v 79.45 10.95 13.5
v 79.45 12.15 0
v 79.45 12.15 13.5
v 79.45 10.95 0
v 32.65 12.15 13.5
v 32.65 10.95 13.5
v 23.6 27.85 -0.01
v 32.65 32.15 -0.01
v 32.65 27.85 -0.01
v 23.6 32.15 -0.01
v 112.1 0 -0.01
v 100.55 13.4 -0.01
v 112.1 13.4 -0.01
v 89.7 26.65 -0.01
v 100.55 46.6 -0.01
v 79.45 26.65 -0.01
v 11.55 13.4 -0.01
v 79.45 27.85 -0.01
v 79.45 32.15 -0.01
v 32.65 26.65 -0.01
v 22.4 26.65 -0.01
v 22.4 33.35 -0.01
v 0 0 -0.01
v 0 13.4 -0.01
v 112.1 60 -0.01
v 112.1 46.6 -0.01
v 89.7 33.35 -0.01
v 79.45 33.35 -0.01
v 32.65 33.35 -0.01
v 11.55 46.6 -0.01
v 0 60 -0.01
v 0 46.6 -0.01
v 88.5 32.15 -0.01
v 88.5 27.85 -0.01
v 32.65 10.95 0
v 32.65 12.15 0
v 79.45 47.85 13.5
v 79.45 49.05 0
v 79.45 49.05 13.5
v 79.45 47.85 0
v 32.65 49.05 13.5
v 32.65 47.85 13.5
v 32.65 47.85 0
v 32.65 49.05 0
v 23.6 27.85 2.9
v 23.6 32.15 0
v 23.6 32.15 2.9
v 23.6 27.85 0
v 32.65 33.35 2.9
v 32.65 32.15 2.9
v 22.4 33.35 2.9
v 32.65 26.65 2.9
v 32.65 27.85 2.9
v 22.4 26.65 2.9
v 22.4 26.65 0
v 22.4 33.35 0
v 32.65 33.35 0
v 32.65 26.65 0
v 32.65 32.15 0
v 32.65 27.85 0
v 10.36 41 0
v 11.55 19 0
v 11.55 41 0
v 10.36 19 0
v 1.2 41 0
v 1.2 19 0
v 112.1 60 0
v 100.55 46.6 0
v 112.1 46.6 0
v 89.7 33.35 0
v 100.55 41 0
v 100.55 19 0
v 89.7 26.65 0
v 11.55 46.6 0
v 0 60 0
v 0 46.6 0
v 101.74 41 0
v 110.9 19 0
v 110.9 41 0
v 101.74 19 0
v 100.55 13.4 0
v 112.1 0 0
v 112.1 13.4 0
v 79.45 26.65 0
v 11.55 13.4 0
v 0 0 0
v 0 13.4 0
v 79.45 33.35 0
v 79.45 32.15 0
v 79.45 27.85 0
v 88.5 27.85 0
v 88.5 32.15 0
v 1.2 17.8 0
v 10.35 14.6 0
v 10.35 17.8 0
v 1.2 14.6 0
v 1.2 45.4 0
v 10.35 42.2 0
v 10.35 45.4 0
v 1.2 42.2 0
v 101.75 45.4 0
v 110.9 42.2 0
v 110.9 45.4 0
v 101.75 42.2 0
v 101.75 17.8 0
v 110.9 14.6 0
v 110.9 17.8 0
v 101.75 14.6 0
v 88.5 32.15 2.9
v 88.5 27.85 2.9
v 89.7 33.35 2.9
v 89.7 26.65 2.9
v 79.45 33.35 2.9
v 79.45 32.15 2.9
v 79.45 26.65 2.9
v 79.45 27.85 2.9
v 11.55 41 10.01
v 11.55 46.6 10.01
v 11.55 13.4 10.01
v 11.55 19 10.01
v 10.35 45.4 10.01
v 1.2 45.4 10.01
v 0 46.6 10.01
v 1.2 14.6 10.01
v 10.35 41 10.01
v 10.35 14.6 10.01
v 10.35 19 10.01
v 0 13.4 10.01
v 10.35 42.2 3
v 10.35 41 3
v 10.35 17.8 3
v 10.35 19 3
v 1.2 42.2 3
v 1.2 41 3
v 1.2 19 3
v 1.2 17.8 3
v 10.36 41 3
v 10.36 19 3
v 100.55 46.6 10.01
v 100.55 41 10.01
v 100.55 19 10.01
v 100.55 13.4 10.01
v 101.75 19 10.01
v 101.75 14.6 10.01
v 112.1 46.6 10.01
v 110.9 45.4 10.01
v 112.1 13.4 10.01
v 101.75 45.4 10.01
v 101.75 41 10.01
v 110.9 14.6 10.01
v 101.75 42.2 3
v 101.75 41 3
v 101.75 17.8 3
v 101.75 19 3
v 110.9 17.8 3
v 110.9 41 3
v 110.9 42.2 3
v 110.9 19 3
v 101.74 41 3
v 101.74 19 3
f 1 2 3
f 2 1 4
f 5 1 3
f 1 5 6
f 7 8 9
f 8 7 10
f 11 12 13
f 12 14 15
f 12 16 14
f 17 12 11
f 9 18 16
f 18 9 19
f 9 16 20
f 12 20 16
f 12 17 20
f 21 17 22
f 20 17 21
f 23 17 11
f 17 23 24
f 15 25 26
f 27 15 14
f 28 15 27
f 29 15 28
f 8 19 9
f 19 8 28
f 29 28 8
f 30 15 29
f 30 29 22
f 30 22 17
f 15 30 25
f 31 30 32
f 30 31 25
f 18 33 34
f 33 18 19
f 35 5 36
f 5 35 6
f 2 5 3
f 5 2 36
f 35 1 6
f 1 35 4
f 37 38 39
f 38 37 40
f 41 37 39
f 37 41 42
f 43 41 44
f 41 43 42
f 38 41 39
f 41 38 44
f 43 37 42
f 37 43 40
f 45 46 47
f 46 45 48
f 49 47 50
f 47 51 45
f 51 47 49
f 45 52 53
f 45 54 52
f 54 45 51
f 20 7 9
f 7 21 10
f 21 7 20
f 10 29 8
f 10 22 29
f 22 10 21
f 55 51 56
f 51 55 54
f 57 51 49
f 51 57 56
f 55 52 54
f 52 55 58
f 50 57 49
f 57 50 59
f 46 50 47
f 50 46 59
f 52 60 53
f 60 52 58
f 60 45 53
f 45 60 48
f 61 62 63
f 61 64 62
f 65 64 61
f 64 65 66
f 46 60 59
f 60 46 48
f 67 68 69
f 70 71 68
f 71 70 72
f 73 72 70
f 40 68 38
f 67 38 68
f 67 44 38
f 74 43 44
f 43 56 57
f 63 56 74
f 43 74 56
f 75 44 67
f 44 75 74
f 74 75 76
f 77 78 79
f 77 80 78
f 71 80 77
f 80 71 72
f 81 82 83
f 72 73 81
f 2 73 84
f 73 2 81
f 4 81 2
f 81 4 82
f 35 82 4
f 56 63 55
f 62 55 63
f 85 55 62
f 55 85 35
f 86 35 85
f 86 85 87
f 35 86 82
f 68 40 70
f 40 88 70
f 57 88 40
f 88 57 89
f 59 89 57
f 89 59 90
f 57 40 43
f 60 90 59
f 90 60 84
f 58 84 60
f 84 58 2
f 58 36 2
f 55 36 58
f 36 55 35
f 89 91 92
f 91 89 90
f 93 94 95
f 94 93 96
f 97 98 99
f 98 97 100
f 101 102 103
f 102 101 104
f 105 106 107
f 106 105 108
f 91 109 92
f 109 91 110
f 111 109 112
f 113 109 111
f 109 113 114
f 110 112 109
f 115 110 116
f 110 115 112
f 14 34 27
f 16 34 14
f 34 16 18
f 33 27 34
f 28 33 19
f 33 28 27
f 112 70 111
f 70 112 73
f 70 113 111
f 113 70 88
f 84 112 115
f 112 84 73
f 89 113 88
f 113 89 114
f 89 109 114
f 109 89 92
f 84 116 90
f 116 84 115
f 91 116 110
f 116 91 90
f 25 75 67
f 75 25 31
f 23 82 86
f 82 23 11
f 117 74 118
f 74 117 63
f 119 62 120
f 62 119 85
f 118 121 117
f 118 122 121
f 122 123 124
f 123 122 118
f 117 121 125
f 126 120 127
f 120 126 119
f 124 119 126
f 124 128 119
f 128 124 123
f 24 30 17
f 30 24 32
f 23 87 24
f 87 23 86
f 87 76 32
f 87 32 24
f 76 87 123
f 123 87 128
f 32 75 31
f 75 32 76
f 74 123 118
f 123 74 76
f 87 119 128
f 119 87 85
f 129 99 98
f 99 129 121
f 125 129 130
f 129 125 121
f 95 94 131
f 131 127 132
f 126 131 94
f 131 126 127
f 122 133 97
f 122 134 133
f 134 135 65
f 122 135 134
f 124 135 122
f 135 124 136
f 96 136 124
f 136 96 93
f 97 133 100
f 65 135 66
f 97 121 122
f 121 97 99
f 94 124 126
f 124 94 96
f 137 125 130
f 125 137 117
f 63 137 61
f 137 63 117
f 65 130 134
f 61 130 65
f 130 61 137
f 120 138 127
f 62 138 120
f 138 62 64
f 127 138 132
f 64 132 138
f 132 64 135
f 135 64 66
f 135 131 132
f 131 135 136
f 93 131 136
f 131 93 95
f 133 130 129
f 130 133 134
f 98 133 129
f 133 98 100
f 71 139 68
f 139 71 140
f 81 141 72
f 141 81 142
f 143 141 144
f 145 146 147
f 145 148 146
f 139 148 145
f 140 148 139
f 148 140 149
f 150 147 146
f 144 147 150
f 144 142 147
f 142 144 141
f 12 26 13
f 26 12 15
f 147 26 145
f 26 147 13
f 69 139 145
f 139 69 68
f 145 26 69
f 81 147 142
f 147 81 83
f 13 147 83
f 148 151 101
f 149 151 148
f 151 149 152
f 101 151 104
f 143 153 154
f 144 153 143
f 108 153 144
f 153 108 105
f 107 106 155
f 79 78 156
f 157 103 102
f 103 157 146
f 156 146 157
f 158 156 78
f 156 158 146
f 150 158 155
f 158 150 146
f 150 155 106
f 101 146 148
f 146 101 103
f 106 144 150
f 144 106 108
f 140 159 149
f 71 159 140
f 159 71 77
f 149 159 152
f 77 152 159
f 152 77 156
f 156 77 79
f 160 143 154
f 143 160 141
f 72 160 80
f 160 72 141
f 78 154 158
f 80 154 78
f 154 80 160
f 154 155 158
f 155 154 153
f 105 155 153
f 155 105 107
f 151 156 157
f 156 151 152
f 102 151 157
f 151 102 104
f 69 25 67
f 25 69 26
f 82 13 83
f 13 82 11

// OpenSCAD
// file: ../Base/Boxes.scad
// Fischertechnik Box Foundation
// Pre-designed Boxes

use <Constants.scad>

include <PlacementOptions.scad>

box190Width = 190;
box190Depth = 130;
box130Width = 130;
box130Depth = 95;
boxUsageHeight = 33.9;
boxWallThickness = 2.4;
boxBaseThickness = 1.0;

// getBoxWallThickness()
// Gets the wall thickness of a Fischertechnik Box

function getBoxWallThickness() = boxWallThickness;

// Gets the usable height of a fischertechnik box
function getBoxUsageHeight() = boxUsageHeight;

// Gets the thickness of the Fischertechnik box base.
function getBoxBaseThickness() = boxBaseThickness;

// Gets the usable inner space of a Box 190 as an x/y-list
function getBox190Space() = [
    box190Width - 2*getBoxWallThickness(), 
    box190Depth - 2*getBoxWallThickness() ];

// Imports the Fischertechnik empty box 130x190 mm and places it at position 0,0
// 190x130 are the outer sizes, the inner space is slightly smaller. Use getBox190Space() to get the inner sizes.
// This module needs the STL file "Fischertechnik Box 130x190.stl" in the library path.
// The box is positioned that the usable inner space is at the 0,0,0 position. The

module Box190() {
    translate([-getBoxWallThickness(),-getBoxWallThickness(),-getBoxBaseThickness()])
        import("Fischertechnik Box 130x190.stl", convexity=3);
}

// Gets the usable inner space of a Box 130 as an x/y-list
function getBox130Space() = [
    box130Width - 2*getBoxWallThickness(), 
    box130Depth - 2*getBoxWallThickness() ];

// Imports the Fischertechnik empty box 95x130 mm and places it at position 0,0
// 190x130 are the outer sizes, the inner space is slightly smaller. Use getBox190Space() to get the inner sizes.
// This module needs the STL file "Fischertechnik Box 95x130.stl" in the library path.
// The box is positioned that the usable inner space is at the 0,0,0 position. The

module Box130() {
    translate([-getBoxWallThickness(),-getBoxWallThickness(),-getBoxBaseThickness()])
        import("Fischertechnik Box 95x130.stl", convexity=3);
}

// Creates a web at the specified box walls
// corner 0 = LowerLeft, 1 = UpperLeft, 2 = UpperRight, 3 = LowerRight
// side 0 = LeftOfCorner, 1 = RightOfCorner
// distance = Distance in mm from the corner
// box = inner width and depth of the box (default: Box 190)
// webWidth = length of the web (default is 3 mms)
// webThickness = thickness of the web (default is 1 mm)

module BoxWeb(corner, side, distance, box=getBox190Space(), webWidth=3, webThickness=1.0) {
    sink = getBoxWallThickness()/2;

    width = (corner % 2 == 0) ? 
            (side == LeftOfCorner ? webWidth : webThickness) :
            (side == LeftOfCorner ? webThickness : webWidth);

    depth = (corner % 2 == 0) ? 
            (side == RightOfCorner ? webWidth : webThickness) :
            (side == RightOfCorner ? webThickness : webWidth);
    
    xDiff = corner == LowerLeft ? 
                (side == LeftOfCorner ? -sink : distance) :
            (corner == UpperLeft ?                
                (side == LeftOfCorner ? distance : -sink) :
            (corner == UpperRight ?
                (side == LeftOfCorner ? box.x-webWidth+sink : box.x-distance-webThickness) :
                (side == LeftOfCorner ? box.x-distance-webThickness: box.x-webWidth+sink)));

    yDiff = corner == LowerLeft ? 
                (side == RightOfCorner ? -sink : distance) :
            (corner == UpperLeft ?
                (side == RightOfCorner ? box.y-distance : box.y-webWidth+sink) :
            (corner == UpperRight ?
                (side == RightOfCorner ? box.y-webWidth+sink : box.y-distance) :
                (side == RightOfCorner ? distance : -sink)));
    
    translate([xDiff, yDiff, -getExcess()])
        cube([width, depth, boxUsageHeight + 2*getExcess()]);
}
// file: ../Base/Rotation.scad
// Fischertechnik Box Foundation
// Geometry Helpers Rotation

include <PlacementOptions.scad>

// getRotatedSpace(space, rotation=NoRotation)
// Rotates the space dependent on the specified rotation

function getRotatedSpace(space, rotation=NoRotation) = [
    (rotation == Rotate90 || rotation == Rotate270) ? space.y : space.x,
    (rotation == Rotate90 || rotation == Rotate270) ? space.x : space.y
];

// Rotates the given space around the fixed left lower corner
// space = the space the children needs as width/depth list [width,depth]
// rotation = 0 Rotate0 degrees, 1 Rotate90 degrees, 2 Rotate180 degrees, 3 Rotate270 degrees (equivalent to -90)

module RotateFix(space, rotation=Rotate0) {
    dy = (rotation == Rotate0 || rotation == Rotate270) ? 0 :
        (rotation == Rotate90) ? space.x :
        space.y;
    dx = (rotation < Rotate180) ? 0 :
        (rotation == Rotate180) ? space.x :
        space.y;
    
    translate([dx, dy, 0])
        rotate([0, 0, rotations[rotation]])
            children();
}
// file: ../Base/Alignment.scad
// Fischertechnik Box Foundation
// Geometry Helpers Alignment

include <PlacementOptions.scad>

// getAlignedX(elementWidth, spaceWidth, align=AlignRight, offset=0)
// Gets the aligned X offset of an element with the given
// width in the given space.
// elementWidth = The width of the element to positon
// spaceWidth = The space where the element should be aligned
// align = 0 AlignLeft, 1 AlignCenter, 2 AlignRight
// offset = an optional offset from the aligned position. When
// aligned left or centered, then positive values are in X direction.
// When aligned right then positive values are in negative X direction.

function getAlignedX(elementWidth, spaceWidth, align=AlignRight, offset=0) =
    (align == AlignLeft) ?
        offset :
        ((align == AlignCenter) ?
        (spaceWidth - elementWidth)/2 + offset :
        spaceWidth - offset - elementWidth);

// getAlignedY(elementDepth, spaceDepth, align=AlignTop, offset=0)
// Gets the aligned Y offset of an element with the given
// depth in the given space.
// elementDepth = The depth of the element to positon
// spaceDepth = The space where the element should be aligned
// align = 0 AlignBottom, 1 AlignCenter, 2 AlignTop
// offset = an optional offset from the aligned position. When
// aligned bottom or centered, then positive values are in Y direction.
// When aligned top then positive values are in negative Y direction.

function getAlignedY(elementDepth, spaceDepth, align=AlignTop, offset=0) =
    (align == AlignBottom) ?
        offset :
        ((align == AlignCenter) ?
        (spaceDepth - elementDepth)/2 + offset :
        spaceDepth - offset - elementDepth);
// file: ../Base/PlacementOptions.scad
// Fischertechnik Box Foundation
// Placement Options

// Alignment
NoAlign = 0;
AlignLeft = 1;
AlignBottom = 2;
AlignCenter = 3;
AlignRight = 4;
AlignTop = 5;

// Element rotation degree steps
rotations = [0, -90, -180, -270];

// Rotation
NoRotation = 0;
Rotate0 = 0;
Rotate90 = 1;
Rotate180 = 2;
Rotate270 = 3;

// Docking (seen from above)
NoDock = -1;
DockLeft = 0;
DockTop = 1;
DockRight = 2;
DockCorner = 2;
DockBottom = 3;

// Web corners
LowerLeft = 0;
UpperLeft = 1;
UpperRight = 2;
LowerRight = 3;

// Web position relative to corner
LeftOfCorner = 0;
RightOfCorner = 1;
// file: ../Base/Placement.scad
// Fischertechnik Box Foundation
// Geometry Helpers Placement

use <Constants.scad>
use <Alignment.scad>
use <Rotation.scad>
use <Boxes.scad>

include <PlacementOptions.scad>

// Place(x=0, y=0, elementSpace=[0,0], alignX=AlignLeft, alignY=AlignBottom, rotation=Rotate0, boxSpace=getBox190Space())
// Places the child at the specified position
// y = Y-Position. This is a relative position when an X aligment is specified.
// x = X-Position. This is a relative position when an Y aligment is specified.
// elementSpace = space of the element to be placed [x,y]
// alignX = -1=NoAlign, 0 AlignLeft, 1 AlignCenter, 3 AlignRight (elementSpace and boxSpace required!)
// alignY = -1=NoAlign, 2 AlignBottom, 1 AlignCenter, 4 AlignTop (elementSpace and boxSpace required!)
// rotation = 0 Rotate0 0 degrees, 1 Rotate90 90 degrees, 
// 2 Rotate180 180 degrees, 3 Rotate270 270 degrees (equivalent to -90)
// boxSpace = Inner space of the box where the placement occurs [x,y] - default is Box 190x130 inner space

module Place(x=0, y=0, elementSpace=[0,0], 
  alignX=AlignLeft, alignY=AlignBottom, 
  rotation=NoRotation, boxSpace=getBox190Space()) {

    module Position(x, y, space, rotation=Rotate0) {
        translate([x, y, 0])
            RotateFix(space, rotation)
                children(0);
    }

    space = getRotatedSpace(elementSpace, rotation);
    alignedX = getAlignedX(space.x, boxSpace.x, alignX, x);
    alignedY = getAlignedY(space.y, boxSpace.y, alignY, y);
    Position(alignedX, alignedY, elementSpace, rotation)
        children(0);
}

// Center(space=getBox130Space(), elementSpace=[0,0])
// space = Space where the children is centered. For cylinder use centered=true and no elementSpace.
// elementSpace = space of the element to be centered [x,y]

module Center(space=getBox190Space(), elementSpace=[0,0]) {
    translate([(space.x - elementSpace.x) / 2, (space.y - elementSpace.y) / 2])
        children(0);
}

// CenterHorizontal(width=0, y=0, offset=0, space=getBox130Space())
// space = Space where the children is centered. For cylinder use centered=true and no elementSpace.
// elementSpace = space of the element to be centered [x,y]

module CenterHorizontal(width=0, y=0, offset=0, space=getBox190Space()) {
    translate([(space.x - width) / 2 + offset, y])
        children(0);
}

// CenterVertical(depth=0, x=0, offset=0, space=getBox130Space())
// space = Space where the children is centered. For cylinder use centered=true and no elementSpace.
// elementSpace = space of the element to be centered [x,y]

module CenterVerticalal(depth=0, x=0, offset=0, space=getBox190Space()) {
    translate([x, (space.y - depth) / 2 + offset])
        children(0);
}
// file: FrameCouplingBracket.scad
// Fischertechnik Box Library
// Coupling Bracket
// 38252

use <../Base/Constants.scad>
use <../ModelBase/Simple.scad>
use <../ModelBase/Complex.scad>

width = 9.15 - getTolerance();
depth = 30;
height = 10;

// getFrameCouplingBracketSpace()
// Gets the space the frame coupling bracket needs as width and depth (.x and .y as a list)

function getFrameCouplingBracketSpace() = getFrameOuterVolume([width, depth, height]);

// FrameCouplingBracket()
// Coupling Bracket
// 38252

module FrameCouplingBracket() {
    cutOffWidth = 2 * getDividerThickness();
    cutOffDepth = 22;
    cutOffHeight = height + 2*getExcess();
    
    innerVolume = getFrameInnerVolume([width, depth, height]);
    cutOffXOffset = innerVolume.x + 2*getExcess();
    cutoffYOffset = (innerVolume.y - cutOffDepth) / 2 + getDividerThickness();
    
    difference() {
        Frame(innerVolume, tolerance=0);
        translate([cutOffXOffset, cutoffYOffset, 0])
            cube([cutOffWidth, cutOffDepth, cutOffHeight]);
    }
    
    railWidth = innerVolume.x + 2*getExcess();
    railDepth = getDividerThickness();
    railHeight = 3 + getExcess();
    
    railXOffset = getDividerThickness() - getExcess();
    railYOffset1 = cutoffYOffset - getDividerThickness();
    railYOffset2 = cutoffYOffset + cutOffDepth;
    
    translate([railXOffset, 0, -getExcess()]) {
        translate([0, railYOffset1])
            cube([railWidth, railDepth, railHeight]);
        translate([0, railYOffset2])
            cube([railWidth, railDepth, railHeight]);
    }
}

// Test
color("lightgray")
FrameCouplingBracket();
// file: HolderCompleteBucket.scad
// Fischertechnik Box Library
// Complete Bucket Holder
// 37354, 37353, 37355, 38257

use <../Base/Constants.scad>
use <../ModelBase/Simple.scad>
use <../ModelBase/Complex.scad>

width = 89;
depth = 60;

// getHolderCompleteBucketSpace()
// Gets the space the holder complete bucket needs as width and depth (.x and .y as a list)

function getHolderCompleteBucketSpace() = [width, depth];

// HolderCompleteBucket()
// Holder for complete bucket with three middle and two side parts, 
// and a middle axis.
// 37354, 37353, 37355, 38257

module HolderCompleteBucket() {
    railWidth = 46.8;
    railHeight = 13.5;
    railDistance = 35.7;
    outerPinFrameLength = 10.25;
    innerPinFrameLength = outerPinFrameLength - 3*getDividerThickness();
    innerPinFrameDepth = 4.3;
    outerPinFrameDepth = innerPinFrameDepth + 2*getDividerThickness();
    pinFrameHeight = 2.9;
    
    Space(getHolderCompleteBucketSpace());

    railXOffset = (getHolderCompleteBucketSpace().x - railWidth) / 2;
    railYOffset1 = (getHolderCompleteBucketSpace().y - railDistance) / 2 - getDividerThickness();
    railYOffset2 = railYOffset1 + railDistance + getDividerThickness();    
    
    translate([railXOffset, 0, 0]) {
        translate([0, railYOffset1, 0])
            Wall([railWidth, getDividerThickness(), railHeight]);
        translate([0, railYOffset2, 0])
            Wall([railWidth, getDividerThickness(), railHeight]);
    }
    
    midYOffset = (getHolderCompleteBucketSpace().y - outerPinFrameDepth) / 2;
    
    railXOffset1 = railXOffset - outerPinFrameLength;
    translate([railXOffset1, midYOffset, 0])
        DockableFrame([innerPinFrameLength, innerPinFrameDepth, pinFrameHeight], wallRight=false, tolerance=0);
    
    railXOffset2 = outerPinFrameLength + railXOffset + railWidth;
    translate([railXOffset2, midYOffset, 0])
        mirror([1,0,0])
            DockableFrame([innerPinFrameLength, innerPinFrameDepth, pinFrameHeight], wallRight=false, tolerance=0);
}

// Test
color("lightgray")
HolderCompleteBucket();
// file: ../Base/Constants.scad
// Fischertechnik Box Foundation
// Constants

// Constant values necessary for multiple elements

// Base constants
dividerThickness = 1.2;
excess = 0.01;
fragments = 90;
tolerance = 0.8;

// Gets the thickness of a divider 
function getDividerThickness() = dividerThickness;

// Gets the excess that is used to merge walls into each other
function getExcess() = excess;

// Gets amount of fragments of a cylinder
function getFragments() = fragments;

// Gets the inner tolerance of a frame to each side
function getTolerance() = tolerance;


// Fischertechnik specific constants
axisDiameter = 4;
axisBottomDiameter = axisDiameter + 1;
standardEdgeDistance = 2.5;
standardWebDistance = 11.5;
standardCornerLength = 15;
tubeWallFactor = 1.6;

// Gets axis diameter
function getAxisDiameter() = axisDiameter;

// Gets axis bottom diameter for thicker part at the bottom
function getAxisBottomDiameter() = axisBottomDiameter;

// gets the standard distance to the wall of the box for dockable frames with webs
function getStandardEdgeDistance() = standardEdgeDistance;

// gets the standard distance of each web to the corner of the dockable frame
function getStandardWebDistance() = standardWebDistance;

// gets the standard length of the corner walls of a dockable frame
function getStandardCornerLength() = standardCornerLength;

// gets the wall thickness of a tube.
function getTubeWallThickness() = tubeWallFactor * getDividerThickness();
// main file
// Fischertechnik Box Library
// Combo Complete Bucket plus Coupling Brackets
// 38252, 37354, 37353, 37355, 38257

use <../Base/Constants.scad>
use <../ModelBase/Simple.scad>
use <../ModelBase/Complex.scad>

use <HolderCompleteBucket.scad>
use <FrameCouplingBracket.scad>

// getComboCompleteBucketPlusCouplingBracketsSpace()
// Gets the space the combo complete bucket plus two coupling brackets needs as width and depth (.x and .y as a list)

function getComboCompleteBucketPlusCouplingBracketsSpace() = [
    2*getFrameCouplingBracketSpace().x + getHolderCompleteBucketSpace().x, 
    getHolderCompleteBucketSpace().y];

// ComboCompleteBucketPlusCouplingBrackets()
// Holder for complete bucket with three middle and two side parts, 
// and a middle axis plus two frame coupling brackets.
// 37354, 37353, 37355, 38257, 38252

module ComboCompleteBucketPlusCouplingBrackets() {
    Space(getComboCompleteBucketPlusCouplingBracketsSpace());
    
    translate([getFrameCouplingBracketSpace().x, 0, 0])
        HolderCompleteBucket();
    
    yOffset = (getHolderCompleteBucketSpace().y - getFrameCouplingBracketSpace().y) / 2;
    translate([0, yOffset, 0])
        FrameCouplingBracket();
    
    mirror([1, 0, 0])
        translate([-getComboCompleteBucketPlusCouplingBracketsSpace().x, yOffset, 0])
            FrameCouplingBracket();
}

// Test
color("lightgray") {
ComboCompleteBucketPlusCouplingBrackets();
}
